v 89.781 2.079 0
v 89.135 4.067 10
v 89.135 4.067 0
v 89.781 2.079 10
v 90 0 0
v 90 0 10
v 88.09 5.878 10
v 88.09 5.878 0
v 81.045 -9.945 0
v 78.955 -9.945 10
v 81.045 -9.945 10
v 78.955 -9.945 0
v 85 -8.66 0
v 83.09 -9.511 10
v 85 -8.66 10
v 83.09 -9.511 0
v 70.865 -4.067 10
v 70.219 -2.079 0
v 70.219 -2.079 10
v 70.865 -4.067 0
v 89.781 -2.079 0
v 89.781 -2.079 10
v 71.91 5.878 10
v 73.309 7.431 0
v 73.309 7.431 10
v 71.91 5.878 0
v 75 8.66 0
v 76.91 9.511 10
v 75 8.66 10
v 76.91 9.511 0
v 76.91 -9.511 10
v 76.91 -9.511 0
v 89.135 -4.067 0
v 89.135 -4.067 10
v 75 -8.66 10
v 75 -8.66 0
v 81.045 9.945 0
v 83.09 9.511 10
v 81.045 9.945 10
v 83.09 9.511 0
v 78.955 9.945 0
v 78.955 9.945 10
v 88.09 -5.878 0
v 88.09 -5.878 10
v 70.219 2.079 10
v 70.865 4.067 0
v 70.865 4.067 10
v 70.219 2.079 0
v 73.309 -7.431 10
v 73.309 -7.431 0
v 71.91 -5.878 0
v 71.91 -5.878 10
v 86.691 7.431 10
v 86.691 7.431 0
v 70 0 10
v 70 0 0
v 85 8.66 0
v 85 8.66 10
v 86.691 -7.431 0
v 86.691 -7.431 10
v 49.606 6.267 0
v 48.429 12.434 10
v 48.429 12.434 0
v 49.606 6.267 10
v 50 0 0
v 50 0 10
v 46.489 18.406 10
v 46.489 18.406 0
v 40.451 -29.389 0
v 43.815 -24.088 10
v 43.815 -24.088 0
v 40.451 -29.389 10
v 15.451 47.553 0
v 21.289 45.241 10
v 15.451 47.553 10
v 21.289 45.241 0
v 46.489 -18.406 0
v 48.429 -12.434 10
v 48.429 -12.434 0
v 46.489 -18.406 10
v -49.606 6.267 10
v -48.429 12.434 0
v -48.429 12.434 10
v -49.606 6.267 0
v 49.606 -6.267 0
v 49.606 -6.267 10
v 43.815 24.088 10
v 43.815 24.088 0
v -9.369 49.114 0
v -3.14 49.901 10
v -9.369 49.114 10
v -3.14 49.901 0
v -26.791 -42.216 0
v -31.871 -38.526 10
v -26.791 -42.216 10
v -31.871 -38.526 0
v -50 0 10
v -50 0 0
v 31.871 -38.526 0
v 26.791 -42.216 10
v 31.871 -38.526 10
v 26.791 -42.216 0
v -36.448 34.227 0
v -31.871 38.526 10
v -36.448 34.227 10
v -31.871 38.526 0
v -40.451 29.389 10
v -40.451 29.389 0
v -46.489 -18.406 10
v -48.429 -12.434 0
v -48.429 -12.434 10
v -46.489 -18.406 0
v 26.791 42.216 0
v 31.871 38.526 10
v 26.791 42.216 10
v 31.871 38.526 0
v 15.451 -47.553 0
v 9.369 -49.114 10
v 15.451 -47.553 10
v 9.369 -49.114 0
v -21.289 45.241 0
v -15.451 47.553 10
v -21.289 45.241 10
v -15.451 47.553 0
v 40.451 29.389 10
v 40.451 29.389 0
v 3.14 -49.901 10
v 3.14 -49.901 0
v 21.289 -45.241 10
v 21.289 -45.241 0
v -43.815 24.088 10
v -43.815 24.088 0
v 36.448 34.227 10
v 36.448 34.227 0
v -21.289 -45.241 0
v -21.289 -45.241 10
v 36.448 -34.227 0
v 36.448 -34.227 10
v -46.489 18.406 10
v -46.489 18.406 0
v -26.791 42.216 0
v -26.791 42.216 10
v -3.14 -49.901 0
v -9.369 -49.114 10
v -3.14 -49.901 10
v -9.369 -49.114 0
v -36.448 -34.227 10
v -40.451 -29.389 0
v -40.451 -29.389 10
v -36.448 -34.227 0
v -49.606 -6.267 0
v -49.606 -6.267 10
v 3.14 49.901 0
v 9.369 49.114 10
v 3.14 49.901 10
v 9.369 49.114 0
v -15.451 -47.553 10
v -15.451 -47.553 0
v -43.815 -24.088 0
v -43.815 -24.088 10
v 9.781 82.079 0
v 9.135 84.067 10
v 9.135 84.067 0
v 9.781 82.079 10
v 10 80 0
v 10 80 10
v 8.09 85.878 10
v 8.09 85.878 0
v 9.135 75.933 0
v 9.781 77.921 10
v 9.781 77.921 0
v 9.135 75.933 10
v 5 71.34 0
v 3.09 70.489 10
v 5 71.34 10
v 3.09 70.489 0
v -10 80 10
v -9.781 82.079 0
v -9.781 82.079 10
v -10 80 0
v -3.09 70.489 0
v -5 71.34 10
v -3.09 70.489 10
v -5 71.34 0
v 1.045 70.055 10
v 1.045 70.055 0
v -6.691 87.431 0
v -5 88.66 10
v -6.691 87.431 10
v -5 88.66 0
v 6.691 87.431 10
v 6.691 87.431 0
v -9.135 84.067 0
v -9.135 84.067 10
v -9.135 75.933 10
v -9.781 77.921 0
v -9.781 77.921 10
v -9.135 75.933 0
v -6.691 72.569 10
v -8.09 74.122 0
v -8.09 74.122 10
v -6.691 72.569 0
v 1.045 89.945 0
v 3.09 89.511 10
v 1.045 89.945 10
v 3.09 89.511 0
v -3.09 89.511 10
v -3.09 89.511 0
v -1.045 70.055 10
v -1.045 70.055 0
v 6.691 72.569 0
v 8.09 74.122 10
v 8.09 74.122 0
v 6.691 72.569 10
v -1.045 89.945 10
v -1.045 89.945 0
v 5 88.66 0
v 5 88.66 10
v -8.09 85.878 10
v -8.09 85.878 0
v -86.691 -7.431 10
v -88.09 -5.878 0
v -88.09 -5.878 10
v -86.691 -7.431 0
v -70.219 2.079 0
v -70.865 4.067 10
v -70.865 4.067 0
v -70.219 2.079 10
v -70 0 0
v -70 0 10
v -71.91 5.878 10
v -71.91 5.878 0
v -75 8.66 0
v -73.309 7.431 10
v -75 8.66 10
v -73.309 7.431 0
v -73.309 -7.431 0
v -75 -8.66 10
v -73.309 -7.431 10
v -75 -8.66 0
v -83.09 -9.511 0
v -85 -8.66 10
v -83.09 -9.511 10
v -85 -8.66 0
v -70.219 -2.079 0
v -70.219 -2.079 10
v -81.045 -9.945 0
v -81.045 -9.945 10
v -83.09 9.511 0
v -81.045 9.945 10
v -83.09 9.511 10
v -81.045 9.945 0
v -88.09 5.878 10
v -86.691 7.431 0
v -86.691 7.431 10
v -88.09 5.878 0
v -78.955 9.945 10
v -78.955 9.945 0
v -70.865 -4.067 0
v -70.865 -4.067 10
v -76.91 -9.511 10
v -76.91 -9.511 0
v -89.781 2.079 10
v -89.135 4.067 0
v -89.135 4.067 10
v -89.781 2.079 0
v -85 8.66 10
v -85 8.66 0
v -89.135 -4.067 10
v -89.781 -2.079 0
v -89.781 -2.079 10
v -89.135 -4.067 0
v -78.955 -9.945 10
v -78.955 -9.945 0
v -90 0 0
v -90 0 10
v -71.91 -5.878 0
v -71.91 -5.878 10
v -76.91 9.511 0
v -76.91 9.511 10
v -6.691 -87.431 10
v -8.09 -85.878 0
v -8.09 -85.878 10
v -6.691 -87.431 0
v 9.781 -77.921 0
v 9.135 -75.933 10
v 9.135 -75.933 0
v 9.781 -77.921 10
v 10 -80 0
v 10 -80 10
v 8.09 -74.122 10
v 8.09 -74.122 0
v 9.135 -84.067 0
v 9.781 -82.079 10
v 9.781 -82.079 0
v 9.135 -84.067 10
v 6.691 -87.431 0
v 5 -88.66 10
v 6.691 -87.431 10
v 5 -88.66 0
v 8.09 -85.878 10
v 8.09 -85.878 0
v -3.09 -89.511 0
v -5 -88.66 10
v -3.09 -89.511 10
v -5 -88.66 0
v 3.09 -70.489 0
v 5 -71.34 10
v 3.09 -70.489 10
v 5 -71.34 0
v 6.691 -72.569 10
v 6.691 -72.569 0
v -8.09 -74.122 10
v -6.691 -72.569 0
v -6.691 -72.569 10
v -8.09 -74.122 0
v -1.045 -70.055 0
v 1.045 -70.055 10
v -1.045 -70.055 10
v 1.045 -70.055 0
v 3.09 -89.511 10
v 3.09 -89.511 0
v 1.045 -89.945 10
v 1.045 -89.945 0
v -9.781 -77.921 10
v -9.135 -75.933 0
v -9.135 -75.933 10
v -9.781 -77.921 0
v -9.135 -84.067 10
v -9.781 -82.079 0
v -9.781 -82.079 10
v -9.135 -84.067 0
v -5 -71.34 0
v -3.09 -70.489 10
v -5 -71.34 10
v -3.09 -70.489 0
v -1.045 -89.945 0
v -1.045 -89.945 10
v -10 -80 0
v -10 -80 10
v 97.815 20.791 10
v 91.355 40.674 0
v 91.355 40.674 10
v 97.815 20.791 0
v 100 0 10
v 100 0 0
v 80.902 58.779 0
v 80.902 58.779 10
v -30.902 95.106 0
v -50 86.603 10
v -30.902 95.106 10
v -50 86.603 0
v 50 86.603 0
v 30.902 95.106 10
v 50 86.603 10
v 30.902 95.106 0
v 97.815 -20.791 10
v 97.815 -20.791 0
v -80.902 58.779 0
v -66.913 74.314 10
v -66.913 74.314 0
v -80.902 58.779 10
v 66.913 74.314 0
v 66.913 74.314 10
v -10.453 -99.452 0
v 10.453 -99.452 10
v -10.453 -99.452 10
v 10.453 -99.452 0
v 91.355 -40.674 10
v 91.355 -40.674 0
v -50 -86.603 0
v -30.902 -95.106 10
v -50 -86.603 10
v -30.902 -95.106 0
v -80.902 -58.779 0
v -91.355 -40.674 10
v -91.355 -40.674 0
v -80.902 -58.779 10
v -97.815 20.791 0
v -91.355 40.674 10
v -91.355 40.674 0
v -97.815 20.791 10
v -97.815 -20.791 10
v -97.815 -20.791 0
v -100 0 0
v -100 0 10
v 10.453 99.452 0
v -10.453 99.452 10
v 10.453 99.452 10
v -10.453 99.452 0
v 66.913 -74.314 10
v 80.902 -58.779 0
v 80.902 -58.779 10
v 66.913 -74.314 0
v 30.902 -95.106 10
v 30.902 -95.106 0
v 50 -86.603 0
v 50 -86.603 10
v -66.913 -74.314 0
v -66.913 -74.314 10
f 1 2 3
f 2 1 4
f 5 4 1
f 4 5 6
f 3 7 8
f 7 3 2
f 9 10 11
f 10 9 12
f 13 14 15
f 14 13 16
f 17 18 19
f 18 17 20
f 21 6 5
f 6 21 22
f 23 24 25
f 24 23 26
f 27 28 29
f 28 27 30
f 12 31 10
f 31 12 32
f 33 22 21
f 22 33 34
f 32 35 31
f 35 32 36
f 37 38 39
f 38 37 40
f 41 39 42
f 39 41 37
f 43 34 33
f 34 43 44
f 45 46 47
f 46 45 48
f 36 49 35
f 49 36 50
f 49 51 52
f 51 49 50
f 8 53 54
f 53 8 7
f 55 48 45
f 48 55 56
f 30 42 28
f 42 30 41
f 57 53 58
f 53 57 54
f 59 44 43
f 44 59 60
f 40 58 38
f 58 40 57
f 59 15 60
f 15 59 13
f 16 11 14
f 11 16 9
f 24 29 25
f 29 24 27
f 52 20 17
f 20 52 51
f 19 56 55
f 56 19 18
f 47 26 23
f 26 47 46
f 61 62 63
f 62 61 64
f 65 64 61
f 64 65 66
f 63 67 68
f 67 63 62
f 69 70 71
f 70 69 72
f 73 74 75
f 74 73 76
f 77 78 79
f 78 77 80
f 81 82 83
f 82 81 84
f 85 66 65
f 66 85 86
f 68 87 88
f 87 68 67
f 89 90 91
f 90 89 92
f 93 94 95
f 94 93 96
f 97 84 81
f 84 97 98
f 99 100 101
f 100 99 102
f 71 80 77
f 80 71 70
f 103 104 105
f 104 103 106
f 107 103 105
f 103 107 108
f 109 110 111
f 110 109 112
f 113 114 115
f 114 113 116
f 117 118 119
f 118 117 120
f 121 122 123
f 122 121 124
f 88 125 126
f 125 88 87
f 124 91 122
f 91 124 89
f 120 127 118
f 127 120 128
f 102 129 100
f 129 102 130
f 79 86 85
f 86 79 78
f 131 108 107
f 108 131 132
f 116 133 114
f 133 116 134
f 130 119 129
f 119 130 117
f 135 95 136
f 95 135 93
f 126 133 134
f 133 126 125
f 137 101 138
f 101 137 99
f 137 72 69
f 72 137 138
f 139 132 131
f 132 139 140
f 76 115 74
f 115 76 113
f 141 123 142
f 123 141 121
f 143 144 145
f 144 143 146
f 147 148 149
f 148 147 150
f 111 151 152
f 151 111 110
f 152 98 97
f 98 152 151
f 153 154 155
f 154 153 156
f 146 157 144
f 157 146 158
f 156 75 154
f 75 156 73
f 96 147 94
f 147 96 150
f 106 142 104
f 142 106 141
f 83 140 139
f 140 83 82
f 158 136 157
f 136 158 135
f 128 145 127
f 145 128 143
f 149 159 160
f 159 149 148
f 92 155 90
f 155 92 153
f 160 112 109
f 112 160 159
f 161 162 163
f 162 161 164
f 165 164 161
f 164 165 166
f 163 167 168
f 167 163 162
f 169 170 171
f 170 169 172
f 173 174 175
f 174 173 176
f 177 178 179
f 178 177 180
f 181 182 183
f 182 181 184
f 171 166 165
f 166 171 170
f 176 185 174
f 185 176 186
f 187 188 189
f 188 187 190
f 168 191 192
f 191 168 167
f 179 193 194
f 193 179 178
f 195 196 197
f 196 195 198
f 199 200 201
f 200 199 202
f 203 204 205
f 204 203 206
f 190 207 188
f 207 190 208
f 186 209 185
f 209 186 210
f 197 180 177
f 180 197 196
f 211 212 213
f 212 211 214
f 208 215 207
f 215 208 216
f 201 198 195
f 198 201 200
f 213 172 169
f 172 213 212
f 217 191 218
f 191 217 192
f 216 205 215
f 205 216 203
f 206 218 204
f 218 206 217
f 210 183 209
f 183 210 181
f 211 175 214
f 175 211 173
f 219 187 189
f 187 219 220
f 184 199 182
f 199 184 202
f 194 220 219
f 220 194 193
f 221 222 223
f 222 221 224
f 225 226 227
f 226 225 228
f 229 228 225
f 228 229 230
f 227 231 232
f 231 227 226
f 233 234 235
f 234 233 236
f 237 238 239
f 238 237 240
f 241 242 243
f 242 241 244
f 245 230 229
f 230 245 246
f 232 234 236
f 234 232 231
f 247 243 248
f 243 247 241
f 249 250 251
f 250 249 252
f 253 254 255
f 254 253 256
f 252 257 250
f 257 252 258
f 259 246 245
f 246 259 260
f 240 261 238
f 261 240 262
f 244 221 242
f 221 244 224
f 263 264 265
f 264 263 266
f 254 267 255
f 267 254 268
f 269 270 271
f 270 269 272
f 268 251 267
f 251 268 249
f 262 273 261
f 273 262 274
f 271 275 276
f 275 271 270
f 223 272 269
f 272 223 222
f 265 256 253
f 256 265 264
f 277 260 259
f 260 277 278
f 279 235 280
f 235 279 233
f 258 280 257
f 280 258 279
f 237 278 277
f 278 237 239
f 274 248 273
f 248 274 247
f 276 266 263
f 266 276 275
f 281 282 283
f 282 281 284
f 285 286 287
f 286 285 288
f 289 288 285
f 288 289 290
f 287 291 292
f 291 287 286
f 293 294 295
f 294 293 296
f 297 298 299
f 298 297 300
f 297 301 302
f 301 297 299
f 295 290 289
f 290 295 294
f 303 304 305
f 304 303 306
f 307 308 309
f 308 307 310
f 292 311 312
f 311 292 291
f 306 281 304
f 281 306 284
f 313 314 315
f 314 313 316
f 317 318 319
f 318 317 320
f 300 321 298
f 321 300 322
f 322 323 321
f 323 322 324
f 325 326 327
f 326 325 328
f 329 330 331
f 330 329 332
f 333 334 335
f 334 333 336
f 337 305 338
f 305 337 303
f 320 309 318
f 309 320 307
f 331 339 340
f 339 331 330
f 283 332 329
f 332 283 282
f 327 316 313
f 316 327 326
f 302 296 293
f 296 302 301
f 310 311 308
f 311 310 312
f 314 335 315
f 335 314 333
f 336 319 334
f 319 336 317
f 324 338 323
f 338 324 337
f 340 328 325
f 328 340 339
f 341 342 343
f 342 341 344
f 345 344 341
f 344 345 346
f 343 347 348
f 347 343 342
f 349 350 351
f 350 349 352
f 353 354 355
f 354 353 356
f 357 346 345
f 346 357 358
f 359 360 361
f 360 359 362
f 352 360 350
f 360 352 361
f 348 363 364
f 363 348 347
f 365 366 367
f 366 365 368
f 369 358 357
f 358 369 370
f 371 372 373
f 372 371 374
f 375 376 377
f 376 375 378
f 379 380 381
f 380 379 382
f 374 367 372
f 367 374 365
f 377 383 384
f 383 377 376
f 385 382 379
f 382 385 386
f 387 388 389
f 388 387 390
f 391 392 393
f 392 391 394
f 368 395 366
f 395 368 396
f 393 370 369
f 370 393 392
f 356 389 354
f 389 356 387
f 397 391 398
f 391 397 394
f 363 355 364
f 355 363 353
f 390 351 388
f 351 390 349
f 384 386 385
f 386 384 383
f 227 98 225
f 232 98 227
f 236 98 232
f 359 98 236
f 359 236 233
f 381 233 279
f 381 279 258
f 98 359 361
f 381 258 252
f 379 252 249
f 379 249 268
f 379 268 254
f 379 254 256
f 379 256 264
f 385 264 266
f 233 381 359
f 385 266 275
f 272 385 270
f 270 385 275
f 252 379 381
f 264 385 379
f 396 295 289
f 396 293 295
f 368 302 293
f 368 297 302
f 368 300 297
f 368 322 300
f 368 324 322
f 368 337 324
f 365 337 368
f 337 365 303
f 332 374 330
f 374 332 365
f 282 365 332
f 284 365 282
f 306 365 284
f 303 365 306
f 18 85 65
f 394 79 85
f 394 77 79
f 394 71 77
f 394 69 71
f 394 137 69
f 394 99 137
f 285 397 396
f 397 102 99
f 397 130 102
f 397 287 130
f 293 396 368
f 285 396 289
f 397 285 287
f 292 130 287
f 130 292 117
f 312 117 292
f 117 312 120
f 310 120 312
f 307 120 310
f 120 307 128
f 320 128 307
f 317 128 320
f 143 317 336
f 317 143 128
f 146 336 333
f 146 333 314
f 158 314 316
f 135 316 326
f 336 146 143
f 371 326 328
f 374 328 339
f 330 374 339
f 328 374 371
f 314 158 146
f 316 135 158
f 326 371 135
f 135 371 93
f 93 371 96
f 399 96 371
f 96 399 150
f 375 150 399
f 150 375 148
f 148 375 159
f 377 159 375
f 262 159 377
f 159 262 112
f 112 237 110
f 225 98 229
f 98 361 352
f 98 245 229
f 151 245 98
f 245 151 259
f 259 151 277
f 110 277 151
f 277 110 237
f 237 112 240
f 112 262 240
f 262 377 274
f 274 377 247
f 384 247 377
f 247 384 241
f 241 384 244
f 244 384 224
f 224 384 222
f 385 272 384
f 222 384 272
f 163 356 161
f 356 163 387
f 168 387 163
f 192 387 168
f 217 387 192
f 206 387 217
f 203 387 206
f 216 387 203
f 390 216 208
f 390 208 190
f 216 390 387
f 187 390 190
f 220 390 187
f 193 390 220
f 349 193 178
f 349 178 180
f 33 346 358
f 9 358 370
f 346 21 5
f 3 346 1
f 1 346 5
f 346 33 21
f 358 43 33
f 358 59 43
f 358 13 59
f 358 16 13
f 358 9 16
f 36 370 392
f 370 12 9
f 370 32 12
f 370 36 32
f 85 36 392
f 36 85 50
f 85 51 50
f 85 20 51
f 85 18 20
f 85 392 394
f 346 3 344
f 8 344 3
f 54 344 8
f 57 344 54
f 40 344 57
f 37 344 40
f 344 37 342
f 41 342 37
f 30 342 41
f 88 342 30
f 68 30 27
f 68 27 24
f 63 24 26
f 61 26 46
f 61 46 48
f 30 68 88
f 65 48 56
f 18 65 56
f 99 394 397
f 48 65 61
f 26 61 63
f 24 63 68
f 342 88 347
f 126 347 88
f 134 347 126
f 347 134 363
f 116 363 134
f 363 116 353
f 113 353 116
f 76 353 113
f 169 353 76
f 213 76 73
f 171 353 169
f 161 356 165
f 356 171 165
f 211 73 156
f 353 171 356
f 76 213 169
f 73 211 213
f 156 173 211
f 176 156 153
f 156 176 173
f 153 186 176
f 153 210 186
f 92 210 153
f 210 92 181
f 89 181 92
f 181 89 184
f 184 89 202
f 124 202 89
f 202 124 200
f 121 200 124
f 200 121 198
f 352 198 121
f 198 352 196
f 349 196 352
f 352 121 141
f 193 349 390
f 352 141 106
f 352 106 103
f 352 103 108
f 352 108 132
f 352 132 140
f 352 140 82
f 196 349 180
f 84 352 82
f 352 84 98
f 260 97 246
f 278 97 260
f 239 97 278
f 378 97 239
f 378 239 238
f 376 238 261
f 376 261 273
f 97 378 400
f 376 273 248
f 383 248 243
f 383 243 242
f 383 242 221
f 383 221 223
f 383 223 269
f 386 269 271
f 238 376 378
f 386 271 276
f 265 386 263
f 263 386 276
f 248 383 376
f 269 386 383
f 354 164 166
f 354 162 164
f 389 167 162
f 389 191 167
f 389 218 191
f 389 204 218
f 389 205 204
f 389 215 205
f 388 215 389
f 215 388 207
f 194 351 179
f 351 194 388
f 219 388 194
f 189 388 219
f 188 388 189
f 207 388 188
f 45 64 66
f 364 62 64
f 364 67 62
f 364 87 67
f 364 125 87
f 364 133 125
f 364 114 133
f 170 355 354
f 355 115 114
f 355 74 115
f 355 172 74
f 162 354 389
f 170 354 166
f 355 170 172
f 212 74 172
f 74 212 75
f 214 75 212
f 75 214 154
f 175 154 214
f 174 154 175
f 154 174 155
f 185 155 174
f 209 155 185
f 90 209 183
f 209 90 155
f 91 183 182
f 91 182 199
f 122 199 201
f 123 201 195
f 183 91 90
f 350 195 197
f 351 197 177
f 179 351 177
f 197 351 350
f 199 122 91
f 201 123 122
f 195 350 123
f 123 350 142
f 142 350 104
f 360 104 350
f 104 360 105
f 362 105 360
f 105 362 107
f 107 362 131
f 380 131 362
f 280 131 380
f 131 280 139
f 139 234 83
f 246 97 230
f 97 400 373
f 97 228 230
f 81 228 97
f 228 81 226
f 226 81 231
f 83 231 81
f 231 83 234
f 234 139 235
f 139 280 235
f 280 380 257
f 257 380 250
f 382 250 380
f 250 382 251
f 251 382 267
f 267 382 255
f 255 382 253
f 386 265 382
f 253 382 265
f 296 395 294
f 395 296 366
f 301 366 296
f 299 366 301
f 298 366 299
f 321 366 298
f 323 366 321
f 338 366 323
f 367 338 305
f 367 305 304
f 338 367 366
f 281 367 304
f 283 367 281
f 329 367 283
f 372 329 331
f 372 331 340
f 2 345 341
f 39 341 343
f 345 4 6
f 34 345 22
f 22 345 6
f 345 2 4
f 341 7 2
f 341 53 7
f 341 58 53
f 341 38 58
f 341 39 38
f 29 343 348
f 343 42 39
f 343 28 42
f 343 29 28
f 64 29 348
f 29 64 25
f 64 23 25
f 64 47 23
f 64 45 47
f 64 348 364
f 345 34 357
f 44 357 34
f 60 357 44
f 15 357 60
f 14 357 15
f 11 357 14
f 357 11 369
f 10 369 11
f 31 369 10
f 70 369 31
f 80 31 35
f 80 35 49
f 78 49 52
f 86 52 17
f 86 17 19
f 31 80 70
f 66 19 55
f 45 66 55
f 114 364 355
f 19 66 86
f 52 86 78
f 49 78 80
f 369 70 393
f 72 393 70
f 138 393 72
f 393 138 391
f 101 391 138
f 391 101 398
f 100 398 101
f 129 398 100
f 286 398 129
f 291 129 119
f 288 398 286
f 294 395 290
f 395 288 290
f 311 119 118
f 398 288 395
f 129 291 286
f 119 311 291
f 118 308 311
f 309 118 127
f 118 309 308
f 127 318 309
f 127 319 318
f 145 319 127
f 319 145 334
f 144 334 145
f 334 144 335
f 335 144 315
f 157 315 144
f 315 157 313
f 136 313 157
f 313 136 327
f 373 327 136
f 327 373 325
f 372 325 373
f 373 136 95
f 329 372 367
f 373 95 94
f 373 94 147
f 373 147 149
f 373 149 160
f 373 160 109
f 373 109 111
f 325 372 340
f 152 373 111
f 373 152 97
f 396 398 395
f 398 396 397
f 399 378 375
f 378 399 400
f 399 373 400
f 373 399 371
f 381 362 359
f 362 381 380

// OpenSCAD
module Flange_01(){

    color("#c0c6c7")
    difference(){
        cylinder(10,100,100,$fn=30);

        r = 80;
        for (i=[0:90:359]) {
            translate([r*cos(i),r*sin(i),-1])
            cylinder(12,10,10,$fn=30);
            translate([0,0,-1]) 
            cylinder(12,50,50,$fn=50);   
        }

    }

}

Flange_01();

// Written by Nicolì Angelo (Gengio) 2024: 
// MIT License

//Permission is hereby granted, free of charge, to any person obtaining a copy of this software and associated documentation files (the "Software"), to deal in the Software without restriction, including without limitation the rights to use, copy, modify, merge, publish, distribute, sublicense, and/or sell copies of the Software, and to permit persons to whom the Software is furnished to do so, subject to the following conditions:

//The above copyright notice and this permission notice shall be included in all copies or substantial portions of the Software.

//THE SOFTWARE IS PROVIDED "AS IS", WITHOUT WARRANTY OF ANY KIND, EXPRESS OR IMPLIED, INCLUDING BUT NOT LIMITED TO THE WARRANTIES OF MERCHANTABILITY, FITNESS FOR A PARTICULAR PURPOSE AND NONINFRINGEMENT. IN NO EVENT SHALL THE AUTHORS OR COPYRIGHT HOLDERS BE LIABLE FOR ANY CLAIM, DAMAGES OR OTHER LIABILITY, WHETHER IN AN ACTION OF CONTRACT, TORT OR OTHERWISE, ARISING FROM, OUT OF OR IN CONNECTION WITH THE SOFTWARE OR THE USE OR OTHER DEALINGS IN THE SOFTWARE.
